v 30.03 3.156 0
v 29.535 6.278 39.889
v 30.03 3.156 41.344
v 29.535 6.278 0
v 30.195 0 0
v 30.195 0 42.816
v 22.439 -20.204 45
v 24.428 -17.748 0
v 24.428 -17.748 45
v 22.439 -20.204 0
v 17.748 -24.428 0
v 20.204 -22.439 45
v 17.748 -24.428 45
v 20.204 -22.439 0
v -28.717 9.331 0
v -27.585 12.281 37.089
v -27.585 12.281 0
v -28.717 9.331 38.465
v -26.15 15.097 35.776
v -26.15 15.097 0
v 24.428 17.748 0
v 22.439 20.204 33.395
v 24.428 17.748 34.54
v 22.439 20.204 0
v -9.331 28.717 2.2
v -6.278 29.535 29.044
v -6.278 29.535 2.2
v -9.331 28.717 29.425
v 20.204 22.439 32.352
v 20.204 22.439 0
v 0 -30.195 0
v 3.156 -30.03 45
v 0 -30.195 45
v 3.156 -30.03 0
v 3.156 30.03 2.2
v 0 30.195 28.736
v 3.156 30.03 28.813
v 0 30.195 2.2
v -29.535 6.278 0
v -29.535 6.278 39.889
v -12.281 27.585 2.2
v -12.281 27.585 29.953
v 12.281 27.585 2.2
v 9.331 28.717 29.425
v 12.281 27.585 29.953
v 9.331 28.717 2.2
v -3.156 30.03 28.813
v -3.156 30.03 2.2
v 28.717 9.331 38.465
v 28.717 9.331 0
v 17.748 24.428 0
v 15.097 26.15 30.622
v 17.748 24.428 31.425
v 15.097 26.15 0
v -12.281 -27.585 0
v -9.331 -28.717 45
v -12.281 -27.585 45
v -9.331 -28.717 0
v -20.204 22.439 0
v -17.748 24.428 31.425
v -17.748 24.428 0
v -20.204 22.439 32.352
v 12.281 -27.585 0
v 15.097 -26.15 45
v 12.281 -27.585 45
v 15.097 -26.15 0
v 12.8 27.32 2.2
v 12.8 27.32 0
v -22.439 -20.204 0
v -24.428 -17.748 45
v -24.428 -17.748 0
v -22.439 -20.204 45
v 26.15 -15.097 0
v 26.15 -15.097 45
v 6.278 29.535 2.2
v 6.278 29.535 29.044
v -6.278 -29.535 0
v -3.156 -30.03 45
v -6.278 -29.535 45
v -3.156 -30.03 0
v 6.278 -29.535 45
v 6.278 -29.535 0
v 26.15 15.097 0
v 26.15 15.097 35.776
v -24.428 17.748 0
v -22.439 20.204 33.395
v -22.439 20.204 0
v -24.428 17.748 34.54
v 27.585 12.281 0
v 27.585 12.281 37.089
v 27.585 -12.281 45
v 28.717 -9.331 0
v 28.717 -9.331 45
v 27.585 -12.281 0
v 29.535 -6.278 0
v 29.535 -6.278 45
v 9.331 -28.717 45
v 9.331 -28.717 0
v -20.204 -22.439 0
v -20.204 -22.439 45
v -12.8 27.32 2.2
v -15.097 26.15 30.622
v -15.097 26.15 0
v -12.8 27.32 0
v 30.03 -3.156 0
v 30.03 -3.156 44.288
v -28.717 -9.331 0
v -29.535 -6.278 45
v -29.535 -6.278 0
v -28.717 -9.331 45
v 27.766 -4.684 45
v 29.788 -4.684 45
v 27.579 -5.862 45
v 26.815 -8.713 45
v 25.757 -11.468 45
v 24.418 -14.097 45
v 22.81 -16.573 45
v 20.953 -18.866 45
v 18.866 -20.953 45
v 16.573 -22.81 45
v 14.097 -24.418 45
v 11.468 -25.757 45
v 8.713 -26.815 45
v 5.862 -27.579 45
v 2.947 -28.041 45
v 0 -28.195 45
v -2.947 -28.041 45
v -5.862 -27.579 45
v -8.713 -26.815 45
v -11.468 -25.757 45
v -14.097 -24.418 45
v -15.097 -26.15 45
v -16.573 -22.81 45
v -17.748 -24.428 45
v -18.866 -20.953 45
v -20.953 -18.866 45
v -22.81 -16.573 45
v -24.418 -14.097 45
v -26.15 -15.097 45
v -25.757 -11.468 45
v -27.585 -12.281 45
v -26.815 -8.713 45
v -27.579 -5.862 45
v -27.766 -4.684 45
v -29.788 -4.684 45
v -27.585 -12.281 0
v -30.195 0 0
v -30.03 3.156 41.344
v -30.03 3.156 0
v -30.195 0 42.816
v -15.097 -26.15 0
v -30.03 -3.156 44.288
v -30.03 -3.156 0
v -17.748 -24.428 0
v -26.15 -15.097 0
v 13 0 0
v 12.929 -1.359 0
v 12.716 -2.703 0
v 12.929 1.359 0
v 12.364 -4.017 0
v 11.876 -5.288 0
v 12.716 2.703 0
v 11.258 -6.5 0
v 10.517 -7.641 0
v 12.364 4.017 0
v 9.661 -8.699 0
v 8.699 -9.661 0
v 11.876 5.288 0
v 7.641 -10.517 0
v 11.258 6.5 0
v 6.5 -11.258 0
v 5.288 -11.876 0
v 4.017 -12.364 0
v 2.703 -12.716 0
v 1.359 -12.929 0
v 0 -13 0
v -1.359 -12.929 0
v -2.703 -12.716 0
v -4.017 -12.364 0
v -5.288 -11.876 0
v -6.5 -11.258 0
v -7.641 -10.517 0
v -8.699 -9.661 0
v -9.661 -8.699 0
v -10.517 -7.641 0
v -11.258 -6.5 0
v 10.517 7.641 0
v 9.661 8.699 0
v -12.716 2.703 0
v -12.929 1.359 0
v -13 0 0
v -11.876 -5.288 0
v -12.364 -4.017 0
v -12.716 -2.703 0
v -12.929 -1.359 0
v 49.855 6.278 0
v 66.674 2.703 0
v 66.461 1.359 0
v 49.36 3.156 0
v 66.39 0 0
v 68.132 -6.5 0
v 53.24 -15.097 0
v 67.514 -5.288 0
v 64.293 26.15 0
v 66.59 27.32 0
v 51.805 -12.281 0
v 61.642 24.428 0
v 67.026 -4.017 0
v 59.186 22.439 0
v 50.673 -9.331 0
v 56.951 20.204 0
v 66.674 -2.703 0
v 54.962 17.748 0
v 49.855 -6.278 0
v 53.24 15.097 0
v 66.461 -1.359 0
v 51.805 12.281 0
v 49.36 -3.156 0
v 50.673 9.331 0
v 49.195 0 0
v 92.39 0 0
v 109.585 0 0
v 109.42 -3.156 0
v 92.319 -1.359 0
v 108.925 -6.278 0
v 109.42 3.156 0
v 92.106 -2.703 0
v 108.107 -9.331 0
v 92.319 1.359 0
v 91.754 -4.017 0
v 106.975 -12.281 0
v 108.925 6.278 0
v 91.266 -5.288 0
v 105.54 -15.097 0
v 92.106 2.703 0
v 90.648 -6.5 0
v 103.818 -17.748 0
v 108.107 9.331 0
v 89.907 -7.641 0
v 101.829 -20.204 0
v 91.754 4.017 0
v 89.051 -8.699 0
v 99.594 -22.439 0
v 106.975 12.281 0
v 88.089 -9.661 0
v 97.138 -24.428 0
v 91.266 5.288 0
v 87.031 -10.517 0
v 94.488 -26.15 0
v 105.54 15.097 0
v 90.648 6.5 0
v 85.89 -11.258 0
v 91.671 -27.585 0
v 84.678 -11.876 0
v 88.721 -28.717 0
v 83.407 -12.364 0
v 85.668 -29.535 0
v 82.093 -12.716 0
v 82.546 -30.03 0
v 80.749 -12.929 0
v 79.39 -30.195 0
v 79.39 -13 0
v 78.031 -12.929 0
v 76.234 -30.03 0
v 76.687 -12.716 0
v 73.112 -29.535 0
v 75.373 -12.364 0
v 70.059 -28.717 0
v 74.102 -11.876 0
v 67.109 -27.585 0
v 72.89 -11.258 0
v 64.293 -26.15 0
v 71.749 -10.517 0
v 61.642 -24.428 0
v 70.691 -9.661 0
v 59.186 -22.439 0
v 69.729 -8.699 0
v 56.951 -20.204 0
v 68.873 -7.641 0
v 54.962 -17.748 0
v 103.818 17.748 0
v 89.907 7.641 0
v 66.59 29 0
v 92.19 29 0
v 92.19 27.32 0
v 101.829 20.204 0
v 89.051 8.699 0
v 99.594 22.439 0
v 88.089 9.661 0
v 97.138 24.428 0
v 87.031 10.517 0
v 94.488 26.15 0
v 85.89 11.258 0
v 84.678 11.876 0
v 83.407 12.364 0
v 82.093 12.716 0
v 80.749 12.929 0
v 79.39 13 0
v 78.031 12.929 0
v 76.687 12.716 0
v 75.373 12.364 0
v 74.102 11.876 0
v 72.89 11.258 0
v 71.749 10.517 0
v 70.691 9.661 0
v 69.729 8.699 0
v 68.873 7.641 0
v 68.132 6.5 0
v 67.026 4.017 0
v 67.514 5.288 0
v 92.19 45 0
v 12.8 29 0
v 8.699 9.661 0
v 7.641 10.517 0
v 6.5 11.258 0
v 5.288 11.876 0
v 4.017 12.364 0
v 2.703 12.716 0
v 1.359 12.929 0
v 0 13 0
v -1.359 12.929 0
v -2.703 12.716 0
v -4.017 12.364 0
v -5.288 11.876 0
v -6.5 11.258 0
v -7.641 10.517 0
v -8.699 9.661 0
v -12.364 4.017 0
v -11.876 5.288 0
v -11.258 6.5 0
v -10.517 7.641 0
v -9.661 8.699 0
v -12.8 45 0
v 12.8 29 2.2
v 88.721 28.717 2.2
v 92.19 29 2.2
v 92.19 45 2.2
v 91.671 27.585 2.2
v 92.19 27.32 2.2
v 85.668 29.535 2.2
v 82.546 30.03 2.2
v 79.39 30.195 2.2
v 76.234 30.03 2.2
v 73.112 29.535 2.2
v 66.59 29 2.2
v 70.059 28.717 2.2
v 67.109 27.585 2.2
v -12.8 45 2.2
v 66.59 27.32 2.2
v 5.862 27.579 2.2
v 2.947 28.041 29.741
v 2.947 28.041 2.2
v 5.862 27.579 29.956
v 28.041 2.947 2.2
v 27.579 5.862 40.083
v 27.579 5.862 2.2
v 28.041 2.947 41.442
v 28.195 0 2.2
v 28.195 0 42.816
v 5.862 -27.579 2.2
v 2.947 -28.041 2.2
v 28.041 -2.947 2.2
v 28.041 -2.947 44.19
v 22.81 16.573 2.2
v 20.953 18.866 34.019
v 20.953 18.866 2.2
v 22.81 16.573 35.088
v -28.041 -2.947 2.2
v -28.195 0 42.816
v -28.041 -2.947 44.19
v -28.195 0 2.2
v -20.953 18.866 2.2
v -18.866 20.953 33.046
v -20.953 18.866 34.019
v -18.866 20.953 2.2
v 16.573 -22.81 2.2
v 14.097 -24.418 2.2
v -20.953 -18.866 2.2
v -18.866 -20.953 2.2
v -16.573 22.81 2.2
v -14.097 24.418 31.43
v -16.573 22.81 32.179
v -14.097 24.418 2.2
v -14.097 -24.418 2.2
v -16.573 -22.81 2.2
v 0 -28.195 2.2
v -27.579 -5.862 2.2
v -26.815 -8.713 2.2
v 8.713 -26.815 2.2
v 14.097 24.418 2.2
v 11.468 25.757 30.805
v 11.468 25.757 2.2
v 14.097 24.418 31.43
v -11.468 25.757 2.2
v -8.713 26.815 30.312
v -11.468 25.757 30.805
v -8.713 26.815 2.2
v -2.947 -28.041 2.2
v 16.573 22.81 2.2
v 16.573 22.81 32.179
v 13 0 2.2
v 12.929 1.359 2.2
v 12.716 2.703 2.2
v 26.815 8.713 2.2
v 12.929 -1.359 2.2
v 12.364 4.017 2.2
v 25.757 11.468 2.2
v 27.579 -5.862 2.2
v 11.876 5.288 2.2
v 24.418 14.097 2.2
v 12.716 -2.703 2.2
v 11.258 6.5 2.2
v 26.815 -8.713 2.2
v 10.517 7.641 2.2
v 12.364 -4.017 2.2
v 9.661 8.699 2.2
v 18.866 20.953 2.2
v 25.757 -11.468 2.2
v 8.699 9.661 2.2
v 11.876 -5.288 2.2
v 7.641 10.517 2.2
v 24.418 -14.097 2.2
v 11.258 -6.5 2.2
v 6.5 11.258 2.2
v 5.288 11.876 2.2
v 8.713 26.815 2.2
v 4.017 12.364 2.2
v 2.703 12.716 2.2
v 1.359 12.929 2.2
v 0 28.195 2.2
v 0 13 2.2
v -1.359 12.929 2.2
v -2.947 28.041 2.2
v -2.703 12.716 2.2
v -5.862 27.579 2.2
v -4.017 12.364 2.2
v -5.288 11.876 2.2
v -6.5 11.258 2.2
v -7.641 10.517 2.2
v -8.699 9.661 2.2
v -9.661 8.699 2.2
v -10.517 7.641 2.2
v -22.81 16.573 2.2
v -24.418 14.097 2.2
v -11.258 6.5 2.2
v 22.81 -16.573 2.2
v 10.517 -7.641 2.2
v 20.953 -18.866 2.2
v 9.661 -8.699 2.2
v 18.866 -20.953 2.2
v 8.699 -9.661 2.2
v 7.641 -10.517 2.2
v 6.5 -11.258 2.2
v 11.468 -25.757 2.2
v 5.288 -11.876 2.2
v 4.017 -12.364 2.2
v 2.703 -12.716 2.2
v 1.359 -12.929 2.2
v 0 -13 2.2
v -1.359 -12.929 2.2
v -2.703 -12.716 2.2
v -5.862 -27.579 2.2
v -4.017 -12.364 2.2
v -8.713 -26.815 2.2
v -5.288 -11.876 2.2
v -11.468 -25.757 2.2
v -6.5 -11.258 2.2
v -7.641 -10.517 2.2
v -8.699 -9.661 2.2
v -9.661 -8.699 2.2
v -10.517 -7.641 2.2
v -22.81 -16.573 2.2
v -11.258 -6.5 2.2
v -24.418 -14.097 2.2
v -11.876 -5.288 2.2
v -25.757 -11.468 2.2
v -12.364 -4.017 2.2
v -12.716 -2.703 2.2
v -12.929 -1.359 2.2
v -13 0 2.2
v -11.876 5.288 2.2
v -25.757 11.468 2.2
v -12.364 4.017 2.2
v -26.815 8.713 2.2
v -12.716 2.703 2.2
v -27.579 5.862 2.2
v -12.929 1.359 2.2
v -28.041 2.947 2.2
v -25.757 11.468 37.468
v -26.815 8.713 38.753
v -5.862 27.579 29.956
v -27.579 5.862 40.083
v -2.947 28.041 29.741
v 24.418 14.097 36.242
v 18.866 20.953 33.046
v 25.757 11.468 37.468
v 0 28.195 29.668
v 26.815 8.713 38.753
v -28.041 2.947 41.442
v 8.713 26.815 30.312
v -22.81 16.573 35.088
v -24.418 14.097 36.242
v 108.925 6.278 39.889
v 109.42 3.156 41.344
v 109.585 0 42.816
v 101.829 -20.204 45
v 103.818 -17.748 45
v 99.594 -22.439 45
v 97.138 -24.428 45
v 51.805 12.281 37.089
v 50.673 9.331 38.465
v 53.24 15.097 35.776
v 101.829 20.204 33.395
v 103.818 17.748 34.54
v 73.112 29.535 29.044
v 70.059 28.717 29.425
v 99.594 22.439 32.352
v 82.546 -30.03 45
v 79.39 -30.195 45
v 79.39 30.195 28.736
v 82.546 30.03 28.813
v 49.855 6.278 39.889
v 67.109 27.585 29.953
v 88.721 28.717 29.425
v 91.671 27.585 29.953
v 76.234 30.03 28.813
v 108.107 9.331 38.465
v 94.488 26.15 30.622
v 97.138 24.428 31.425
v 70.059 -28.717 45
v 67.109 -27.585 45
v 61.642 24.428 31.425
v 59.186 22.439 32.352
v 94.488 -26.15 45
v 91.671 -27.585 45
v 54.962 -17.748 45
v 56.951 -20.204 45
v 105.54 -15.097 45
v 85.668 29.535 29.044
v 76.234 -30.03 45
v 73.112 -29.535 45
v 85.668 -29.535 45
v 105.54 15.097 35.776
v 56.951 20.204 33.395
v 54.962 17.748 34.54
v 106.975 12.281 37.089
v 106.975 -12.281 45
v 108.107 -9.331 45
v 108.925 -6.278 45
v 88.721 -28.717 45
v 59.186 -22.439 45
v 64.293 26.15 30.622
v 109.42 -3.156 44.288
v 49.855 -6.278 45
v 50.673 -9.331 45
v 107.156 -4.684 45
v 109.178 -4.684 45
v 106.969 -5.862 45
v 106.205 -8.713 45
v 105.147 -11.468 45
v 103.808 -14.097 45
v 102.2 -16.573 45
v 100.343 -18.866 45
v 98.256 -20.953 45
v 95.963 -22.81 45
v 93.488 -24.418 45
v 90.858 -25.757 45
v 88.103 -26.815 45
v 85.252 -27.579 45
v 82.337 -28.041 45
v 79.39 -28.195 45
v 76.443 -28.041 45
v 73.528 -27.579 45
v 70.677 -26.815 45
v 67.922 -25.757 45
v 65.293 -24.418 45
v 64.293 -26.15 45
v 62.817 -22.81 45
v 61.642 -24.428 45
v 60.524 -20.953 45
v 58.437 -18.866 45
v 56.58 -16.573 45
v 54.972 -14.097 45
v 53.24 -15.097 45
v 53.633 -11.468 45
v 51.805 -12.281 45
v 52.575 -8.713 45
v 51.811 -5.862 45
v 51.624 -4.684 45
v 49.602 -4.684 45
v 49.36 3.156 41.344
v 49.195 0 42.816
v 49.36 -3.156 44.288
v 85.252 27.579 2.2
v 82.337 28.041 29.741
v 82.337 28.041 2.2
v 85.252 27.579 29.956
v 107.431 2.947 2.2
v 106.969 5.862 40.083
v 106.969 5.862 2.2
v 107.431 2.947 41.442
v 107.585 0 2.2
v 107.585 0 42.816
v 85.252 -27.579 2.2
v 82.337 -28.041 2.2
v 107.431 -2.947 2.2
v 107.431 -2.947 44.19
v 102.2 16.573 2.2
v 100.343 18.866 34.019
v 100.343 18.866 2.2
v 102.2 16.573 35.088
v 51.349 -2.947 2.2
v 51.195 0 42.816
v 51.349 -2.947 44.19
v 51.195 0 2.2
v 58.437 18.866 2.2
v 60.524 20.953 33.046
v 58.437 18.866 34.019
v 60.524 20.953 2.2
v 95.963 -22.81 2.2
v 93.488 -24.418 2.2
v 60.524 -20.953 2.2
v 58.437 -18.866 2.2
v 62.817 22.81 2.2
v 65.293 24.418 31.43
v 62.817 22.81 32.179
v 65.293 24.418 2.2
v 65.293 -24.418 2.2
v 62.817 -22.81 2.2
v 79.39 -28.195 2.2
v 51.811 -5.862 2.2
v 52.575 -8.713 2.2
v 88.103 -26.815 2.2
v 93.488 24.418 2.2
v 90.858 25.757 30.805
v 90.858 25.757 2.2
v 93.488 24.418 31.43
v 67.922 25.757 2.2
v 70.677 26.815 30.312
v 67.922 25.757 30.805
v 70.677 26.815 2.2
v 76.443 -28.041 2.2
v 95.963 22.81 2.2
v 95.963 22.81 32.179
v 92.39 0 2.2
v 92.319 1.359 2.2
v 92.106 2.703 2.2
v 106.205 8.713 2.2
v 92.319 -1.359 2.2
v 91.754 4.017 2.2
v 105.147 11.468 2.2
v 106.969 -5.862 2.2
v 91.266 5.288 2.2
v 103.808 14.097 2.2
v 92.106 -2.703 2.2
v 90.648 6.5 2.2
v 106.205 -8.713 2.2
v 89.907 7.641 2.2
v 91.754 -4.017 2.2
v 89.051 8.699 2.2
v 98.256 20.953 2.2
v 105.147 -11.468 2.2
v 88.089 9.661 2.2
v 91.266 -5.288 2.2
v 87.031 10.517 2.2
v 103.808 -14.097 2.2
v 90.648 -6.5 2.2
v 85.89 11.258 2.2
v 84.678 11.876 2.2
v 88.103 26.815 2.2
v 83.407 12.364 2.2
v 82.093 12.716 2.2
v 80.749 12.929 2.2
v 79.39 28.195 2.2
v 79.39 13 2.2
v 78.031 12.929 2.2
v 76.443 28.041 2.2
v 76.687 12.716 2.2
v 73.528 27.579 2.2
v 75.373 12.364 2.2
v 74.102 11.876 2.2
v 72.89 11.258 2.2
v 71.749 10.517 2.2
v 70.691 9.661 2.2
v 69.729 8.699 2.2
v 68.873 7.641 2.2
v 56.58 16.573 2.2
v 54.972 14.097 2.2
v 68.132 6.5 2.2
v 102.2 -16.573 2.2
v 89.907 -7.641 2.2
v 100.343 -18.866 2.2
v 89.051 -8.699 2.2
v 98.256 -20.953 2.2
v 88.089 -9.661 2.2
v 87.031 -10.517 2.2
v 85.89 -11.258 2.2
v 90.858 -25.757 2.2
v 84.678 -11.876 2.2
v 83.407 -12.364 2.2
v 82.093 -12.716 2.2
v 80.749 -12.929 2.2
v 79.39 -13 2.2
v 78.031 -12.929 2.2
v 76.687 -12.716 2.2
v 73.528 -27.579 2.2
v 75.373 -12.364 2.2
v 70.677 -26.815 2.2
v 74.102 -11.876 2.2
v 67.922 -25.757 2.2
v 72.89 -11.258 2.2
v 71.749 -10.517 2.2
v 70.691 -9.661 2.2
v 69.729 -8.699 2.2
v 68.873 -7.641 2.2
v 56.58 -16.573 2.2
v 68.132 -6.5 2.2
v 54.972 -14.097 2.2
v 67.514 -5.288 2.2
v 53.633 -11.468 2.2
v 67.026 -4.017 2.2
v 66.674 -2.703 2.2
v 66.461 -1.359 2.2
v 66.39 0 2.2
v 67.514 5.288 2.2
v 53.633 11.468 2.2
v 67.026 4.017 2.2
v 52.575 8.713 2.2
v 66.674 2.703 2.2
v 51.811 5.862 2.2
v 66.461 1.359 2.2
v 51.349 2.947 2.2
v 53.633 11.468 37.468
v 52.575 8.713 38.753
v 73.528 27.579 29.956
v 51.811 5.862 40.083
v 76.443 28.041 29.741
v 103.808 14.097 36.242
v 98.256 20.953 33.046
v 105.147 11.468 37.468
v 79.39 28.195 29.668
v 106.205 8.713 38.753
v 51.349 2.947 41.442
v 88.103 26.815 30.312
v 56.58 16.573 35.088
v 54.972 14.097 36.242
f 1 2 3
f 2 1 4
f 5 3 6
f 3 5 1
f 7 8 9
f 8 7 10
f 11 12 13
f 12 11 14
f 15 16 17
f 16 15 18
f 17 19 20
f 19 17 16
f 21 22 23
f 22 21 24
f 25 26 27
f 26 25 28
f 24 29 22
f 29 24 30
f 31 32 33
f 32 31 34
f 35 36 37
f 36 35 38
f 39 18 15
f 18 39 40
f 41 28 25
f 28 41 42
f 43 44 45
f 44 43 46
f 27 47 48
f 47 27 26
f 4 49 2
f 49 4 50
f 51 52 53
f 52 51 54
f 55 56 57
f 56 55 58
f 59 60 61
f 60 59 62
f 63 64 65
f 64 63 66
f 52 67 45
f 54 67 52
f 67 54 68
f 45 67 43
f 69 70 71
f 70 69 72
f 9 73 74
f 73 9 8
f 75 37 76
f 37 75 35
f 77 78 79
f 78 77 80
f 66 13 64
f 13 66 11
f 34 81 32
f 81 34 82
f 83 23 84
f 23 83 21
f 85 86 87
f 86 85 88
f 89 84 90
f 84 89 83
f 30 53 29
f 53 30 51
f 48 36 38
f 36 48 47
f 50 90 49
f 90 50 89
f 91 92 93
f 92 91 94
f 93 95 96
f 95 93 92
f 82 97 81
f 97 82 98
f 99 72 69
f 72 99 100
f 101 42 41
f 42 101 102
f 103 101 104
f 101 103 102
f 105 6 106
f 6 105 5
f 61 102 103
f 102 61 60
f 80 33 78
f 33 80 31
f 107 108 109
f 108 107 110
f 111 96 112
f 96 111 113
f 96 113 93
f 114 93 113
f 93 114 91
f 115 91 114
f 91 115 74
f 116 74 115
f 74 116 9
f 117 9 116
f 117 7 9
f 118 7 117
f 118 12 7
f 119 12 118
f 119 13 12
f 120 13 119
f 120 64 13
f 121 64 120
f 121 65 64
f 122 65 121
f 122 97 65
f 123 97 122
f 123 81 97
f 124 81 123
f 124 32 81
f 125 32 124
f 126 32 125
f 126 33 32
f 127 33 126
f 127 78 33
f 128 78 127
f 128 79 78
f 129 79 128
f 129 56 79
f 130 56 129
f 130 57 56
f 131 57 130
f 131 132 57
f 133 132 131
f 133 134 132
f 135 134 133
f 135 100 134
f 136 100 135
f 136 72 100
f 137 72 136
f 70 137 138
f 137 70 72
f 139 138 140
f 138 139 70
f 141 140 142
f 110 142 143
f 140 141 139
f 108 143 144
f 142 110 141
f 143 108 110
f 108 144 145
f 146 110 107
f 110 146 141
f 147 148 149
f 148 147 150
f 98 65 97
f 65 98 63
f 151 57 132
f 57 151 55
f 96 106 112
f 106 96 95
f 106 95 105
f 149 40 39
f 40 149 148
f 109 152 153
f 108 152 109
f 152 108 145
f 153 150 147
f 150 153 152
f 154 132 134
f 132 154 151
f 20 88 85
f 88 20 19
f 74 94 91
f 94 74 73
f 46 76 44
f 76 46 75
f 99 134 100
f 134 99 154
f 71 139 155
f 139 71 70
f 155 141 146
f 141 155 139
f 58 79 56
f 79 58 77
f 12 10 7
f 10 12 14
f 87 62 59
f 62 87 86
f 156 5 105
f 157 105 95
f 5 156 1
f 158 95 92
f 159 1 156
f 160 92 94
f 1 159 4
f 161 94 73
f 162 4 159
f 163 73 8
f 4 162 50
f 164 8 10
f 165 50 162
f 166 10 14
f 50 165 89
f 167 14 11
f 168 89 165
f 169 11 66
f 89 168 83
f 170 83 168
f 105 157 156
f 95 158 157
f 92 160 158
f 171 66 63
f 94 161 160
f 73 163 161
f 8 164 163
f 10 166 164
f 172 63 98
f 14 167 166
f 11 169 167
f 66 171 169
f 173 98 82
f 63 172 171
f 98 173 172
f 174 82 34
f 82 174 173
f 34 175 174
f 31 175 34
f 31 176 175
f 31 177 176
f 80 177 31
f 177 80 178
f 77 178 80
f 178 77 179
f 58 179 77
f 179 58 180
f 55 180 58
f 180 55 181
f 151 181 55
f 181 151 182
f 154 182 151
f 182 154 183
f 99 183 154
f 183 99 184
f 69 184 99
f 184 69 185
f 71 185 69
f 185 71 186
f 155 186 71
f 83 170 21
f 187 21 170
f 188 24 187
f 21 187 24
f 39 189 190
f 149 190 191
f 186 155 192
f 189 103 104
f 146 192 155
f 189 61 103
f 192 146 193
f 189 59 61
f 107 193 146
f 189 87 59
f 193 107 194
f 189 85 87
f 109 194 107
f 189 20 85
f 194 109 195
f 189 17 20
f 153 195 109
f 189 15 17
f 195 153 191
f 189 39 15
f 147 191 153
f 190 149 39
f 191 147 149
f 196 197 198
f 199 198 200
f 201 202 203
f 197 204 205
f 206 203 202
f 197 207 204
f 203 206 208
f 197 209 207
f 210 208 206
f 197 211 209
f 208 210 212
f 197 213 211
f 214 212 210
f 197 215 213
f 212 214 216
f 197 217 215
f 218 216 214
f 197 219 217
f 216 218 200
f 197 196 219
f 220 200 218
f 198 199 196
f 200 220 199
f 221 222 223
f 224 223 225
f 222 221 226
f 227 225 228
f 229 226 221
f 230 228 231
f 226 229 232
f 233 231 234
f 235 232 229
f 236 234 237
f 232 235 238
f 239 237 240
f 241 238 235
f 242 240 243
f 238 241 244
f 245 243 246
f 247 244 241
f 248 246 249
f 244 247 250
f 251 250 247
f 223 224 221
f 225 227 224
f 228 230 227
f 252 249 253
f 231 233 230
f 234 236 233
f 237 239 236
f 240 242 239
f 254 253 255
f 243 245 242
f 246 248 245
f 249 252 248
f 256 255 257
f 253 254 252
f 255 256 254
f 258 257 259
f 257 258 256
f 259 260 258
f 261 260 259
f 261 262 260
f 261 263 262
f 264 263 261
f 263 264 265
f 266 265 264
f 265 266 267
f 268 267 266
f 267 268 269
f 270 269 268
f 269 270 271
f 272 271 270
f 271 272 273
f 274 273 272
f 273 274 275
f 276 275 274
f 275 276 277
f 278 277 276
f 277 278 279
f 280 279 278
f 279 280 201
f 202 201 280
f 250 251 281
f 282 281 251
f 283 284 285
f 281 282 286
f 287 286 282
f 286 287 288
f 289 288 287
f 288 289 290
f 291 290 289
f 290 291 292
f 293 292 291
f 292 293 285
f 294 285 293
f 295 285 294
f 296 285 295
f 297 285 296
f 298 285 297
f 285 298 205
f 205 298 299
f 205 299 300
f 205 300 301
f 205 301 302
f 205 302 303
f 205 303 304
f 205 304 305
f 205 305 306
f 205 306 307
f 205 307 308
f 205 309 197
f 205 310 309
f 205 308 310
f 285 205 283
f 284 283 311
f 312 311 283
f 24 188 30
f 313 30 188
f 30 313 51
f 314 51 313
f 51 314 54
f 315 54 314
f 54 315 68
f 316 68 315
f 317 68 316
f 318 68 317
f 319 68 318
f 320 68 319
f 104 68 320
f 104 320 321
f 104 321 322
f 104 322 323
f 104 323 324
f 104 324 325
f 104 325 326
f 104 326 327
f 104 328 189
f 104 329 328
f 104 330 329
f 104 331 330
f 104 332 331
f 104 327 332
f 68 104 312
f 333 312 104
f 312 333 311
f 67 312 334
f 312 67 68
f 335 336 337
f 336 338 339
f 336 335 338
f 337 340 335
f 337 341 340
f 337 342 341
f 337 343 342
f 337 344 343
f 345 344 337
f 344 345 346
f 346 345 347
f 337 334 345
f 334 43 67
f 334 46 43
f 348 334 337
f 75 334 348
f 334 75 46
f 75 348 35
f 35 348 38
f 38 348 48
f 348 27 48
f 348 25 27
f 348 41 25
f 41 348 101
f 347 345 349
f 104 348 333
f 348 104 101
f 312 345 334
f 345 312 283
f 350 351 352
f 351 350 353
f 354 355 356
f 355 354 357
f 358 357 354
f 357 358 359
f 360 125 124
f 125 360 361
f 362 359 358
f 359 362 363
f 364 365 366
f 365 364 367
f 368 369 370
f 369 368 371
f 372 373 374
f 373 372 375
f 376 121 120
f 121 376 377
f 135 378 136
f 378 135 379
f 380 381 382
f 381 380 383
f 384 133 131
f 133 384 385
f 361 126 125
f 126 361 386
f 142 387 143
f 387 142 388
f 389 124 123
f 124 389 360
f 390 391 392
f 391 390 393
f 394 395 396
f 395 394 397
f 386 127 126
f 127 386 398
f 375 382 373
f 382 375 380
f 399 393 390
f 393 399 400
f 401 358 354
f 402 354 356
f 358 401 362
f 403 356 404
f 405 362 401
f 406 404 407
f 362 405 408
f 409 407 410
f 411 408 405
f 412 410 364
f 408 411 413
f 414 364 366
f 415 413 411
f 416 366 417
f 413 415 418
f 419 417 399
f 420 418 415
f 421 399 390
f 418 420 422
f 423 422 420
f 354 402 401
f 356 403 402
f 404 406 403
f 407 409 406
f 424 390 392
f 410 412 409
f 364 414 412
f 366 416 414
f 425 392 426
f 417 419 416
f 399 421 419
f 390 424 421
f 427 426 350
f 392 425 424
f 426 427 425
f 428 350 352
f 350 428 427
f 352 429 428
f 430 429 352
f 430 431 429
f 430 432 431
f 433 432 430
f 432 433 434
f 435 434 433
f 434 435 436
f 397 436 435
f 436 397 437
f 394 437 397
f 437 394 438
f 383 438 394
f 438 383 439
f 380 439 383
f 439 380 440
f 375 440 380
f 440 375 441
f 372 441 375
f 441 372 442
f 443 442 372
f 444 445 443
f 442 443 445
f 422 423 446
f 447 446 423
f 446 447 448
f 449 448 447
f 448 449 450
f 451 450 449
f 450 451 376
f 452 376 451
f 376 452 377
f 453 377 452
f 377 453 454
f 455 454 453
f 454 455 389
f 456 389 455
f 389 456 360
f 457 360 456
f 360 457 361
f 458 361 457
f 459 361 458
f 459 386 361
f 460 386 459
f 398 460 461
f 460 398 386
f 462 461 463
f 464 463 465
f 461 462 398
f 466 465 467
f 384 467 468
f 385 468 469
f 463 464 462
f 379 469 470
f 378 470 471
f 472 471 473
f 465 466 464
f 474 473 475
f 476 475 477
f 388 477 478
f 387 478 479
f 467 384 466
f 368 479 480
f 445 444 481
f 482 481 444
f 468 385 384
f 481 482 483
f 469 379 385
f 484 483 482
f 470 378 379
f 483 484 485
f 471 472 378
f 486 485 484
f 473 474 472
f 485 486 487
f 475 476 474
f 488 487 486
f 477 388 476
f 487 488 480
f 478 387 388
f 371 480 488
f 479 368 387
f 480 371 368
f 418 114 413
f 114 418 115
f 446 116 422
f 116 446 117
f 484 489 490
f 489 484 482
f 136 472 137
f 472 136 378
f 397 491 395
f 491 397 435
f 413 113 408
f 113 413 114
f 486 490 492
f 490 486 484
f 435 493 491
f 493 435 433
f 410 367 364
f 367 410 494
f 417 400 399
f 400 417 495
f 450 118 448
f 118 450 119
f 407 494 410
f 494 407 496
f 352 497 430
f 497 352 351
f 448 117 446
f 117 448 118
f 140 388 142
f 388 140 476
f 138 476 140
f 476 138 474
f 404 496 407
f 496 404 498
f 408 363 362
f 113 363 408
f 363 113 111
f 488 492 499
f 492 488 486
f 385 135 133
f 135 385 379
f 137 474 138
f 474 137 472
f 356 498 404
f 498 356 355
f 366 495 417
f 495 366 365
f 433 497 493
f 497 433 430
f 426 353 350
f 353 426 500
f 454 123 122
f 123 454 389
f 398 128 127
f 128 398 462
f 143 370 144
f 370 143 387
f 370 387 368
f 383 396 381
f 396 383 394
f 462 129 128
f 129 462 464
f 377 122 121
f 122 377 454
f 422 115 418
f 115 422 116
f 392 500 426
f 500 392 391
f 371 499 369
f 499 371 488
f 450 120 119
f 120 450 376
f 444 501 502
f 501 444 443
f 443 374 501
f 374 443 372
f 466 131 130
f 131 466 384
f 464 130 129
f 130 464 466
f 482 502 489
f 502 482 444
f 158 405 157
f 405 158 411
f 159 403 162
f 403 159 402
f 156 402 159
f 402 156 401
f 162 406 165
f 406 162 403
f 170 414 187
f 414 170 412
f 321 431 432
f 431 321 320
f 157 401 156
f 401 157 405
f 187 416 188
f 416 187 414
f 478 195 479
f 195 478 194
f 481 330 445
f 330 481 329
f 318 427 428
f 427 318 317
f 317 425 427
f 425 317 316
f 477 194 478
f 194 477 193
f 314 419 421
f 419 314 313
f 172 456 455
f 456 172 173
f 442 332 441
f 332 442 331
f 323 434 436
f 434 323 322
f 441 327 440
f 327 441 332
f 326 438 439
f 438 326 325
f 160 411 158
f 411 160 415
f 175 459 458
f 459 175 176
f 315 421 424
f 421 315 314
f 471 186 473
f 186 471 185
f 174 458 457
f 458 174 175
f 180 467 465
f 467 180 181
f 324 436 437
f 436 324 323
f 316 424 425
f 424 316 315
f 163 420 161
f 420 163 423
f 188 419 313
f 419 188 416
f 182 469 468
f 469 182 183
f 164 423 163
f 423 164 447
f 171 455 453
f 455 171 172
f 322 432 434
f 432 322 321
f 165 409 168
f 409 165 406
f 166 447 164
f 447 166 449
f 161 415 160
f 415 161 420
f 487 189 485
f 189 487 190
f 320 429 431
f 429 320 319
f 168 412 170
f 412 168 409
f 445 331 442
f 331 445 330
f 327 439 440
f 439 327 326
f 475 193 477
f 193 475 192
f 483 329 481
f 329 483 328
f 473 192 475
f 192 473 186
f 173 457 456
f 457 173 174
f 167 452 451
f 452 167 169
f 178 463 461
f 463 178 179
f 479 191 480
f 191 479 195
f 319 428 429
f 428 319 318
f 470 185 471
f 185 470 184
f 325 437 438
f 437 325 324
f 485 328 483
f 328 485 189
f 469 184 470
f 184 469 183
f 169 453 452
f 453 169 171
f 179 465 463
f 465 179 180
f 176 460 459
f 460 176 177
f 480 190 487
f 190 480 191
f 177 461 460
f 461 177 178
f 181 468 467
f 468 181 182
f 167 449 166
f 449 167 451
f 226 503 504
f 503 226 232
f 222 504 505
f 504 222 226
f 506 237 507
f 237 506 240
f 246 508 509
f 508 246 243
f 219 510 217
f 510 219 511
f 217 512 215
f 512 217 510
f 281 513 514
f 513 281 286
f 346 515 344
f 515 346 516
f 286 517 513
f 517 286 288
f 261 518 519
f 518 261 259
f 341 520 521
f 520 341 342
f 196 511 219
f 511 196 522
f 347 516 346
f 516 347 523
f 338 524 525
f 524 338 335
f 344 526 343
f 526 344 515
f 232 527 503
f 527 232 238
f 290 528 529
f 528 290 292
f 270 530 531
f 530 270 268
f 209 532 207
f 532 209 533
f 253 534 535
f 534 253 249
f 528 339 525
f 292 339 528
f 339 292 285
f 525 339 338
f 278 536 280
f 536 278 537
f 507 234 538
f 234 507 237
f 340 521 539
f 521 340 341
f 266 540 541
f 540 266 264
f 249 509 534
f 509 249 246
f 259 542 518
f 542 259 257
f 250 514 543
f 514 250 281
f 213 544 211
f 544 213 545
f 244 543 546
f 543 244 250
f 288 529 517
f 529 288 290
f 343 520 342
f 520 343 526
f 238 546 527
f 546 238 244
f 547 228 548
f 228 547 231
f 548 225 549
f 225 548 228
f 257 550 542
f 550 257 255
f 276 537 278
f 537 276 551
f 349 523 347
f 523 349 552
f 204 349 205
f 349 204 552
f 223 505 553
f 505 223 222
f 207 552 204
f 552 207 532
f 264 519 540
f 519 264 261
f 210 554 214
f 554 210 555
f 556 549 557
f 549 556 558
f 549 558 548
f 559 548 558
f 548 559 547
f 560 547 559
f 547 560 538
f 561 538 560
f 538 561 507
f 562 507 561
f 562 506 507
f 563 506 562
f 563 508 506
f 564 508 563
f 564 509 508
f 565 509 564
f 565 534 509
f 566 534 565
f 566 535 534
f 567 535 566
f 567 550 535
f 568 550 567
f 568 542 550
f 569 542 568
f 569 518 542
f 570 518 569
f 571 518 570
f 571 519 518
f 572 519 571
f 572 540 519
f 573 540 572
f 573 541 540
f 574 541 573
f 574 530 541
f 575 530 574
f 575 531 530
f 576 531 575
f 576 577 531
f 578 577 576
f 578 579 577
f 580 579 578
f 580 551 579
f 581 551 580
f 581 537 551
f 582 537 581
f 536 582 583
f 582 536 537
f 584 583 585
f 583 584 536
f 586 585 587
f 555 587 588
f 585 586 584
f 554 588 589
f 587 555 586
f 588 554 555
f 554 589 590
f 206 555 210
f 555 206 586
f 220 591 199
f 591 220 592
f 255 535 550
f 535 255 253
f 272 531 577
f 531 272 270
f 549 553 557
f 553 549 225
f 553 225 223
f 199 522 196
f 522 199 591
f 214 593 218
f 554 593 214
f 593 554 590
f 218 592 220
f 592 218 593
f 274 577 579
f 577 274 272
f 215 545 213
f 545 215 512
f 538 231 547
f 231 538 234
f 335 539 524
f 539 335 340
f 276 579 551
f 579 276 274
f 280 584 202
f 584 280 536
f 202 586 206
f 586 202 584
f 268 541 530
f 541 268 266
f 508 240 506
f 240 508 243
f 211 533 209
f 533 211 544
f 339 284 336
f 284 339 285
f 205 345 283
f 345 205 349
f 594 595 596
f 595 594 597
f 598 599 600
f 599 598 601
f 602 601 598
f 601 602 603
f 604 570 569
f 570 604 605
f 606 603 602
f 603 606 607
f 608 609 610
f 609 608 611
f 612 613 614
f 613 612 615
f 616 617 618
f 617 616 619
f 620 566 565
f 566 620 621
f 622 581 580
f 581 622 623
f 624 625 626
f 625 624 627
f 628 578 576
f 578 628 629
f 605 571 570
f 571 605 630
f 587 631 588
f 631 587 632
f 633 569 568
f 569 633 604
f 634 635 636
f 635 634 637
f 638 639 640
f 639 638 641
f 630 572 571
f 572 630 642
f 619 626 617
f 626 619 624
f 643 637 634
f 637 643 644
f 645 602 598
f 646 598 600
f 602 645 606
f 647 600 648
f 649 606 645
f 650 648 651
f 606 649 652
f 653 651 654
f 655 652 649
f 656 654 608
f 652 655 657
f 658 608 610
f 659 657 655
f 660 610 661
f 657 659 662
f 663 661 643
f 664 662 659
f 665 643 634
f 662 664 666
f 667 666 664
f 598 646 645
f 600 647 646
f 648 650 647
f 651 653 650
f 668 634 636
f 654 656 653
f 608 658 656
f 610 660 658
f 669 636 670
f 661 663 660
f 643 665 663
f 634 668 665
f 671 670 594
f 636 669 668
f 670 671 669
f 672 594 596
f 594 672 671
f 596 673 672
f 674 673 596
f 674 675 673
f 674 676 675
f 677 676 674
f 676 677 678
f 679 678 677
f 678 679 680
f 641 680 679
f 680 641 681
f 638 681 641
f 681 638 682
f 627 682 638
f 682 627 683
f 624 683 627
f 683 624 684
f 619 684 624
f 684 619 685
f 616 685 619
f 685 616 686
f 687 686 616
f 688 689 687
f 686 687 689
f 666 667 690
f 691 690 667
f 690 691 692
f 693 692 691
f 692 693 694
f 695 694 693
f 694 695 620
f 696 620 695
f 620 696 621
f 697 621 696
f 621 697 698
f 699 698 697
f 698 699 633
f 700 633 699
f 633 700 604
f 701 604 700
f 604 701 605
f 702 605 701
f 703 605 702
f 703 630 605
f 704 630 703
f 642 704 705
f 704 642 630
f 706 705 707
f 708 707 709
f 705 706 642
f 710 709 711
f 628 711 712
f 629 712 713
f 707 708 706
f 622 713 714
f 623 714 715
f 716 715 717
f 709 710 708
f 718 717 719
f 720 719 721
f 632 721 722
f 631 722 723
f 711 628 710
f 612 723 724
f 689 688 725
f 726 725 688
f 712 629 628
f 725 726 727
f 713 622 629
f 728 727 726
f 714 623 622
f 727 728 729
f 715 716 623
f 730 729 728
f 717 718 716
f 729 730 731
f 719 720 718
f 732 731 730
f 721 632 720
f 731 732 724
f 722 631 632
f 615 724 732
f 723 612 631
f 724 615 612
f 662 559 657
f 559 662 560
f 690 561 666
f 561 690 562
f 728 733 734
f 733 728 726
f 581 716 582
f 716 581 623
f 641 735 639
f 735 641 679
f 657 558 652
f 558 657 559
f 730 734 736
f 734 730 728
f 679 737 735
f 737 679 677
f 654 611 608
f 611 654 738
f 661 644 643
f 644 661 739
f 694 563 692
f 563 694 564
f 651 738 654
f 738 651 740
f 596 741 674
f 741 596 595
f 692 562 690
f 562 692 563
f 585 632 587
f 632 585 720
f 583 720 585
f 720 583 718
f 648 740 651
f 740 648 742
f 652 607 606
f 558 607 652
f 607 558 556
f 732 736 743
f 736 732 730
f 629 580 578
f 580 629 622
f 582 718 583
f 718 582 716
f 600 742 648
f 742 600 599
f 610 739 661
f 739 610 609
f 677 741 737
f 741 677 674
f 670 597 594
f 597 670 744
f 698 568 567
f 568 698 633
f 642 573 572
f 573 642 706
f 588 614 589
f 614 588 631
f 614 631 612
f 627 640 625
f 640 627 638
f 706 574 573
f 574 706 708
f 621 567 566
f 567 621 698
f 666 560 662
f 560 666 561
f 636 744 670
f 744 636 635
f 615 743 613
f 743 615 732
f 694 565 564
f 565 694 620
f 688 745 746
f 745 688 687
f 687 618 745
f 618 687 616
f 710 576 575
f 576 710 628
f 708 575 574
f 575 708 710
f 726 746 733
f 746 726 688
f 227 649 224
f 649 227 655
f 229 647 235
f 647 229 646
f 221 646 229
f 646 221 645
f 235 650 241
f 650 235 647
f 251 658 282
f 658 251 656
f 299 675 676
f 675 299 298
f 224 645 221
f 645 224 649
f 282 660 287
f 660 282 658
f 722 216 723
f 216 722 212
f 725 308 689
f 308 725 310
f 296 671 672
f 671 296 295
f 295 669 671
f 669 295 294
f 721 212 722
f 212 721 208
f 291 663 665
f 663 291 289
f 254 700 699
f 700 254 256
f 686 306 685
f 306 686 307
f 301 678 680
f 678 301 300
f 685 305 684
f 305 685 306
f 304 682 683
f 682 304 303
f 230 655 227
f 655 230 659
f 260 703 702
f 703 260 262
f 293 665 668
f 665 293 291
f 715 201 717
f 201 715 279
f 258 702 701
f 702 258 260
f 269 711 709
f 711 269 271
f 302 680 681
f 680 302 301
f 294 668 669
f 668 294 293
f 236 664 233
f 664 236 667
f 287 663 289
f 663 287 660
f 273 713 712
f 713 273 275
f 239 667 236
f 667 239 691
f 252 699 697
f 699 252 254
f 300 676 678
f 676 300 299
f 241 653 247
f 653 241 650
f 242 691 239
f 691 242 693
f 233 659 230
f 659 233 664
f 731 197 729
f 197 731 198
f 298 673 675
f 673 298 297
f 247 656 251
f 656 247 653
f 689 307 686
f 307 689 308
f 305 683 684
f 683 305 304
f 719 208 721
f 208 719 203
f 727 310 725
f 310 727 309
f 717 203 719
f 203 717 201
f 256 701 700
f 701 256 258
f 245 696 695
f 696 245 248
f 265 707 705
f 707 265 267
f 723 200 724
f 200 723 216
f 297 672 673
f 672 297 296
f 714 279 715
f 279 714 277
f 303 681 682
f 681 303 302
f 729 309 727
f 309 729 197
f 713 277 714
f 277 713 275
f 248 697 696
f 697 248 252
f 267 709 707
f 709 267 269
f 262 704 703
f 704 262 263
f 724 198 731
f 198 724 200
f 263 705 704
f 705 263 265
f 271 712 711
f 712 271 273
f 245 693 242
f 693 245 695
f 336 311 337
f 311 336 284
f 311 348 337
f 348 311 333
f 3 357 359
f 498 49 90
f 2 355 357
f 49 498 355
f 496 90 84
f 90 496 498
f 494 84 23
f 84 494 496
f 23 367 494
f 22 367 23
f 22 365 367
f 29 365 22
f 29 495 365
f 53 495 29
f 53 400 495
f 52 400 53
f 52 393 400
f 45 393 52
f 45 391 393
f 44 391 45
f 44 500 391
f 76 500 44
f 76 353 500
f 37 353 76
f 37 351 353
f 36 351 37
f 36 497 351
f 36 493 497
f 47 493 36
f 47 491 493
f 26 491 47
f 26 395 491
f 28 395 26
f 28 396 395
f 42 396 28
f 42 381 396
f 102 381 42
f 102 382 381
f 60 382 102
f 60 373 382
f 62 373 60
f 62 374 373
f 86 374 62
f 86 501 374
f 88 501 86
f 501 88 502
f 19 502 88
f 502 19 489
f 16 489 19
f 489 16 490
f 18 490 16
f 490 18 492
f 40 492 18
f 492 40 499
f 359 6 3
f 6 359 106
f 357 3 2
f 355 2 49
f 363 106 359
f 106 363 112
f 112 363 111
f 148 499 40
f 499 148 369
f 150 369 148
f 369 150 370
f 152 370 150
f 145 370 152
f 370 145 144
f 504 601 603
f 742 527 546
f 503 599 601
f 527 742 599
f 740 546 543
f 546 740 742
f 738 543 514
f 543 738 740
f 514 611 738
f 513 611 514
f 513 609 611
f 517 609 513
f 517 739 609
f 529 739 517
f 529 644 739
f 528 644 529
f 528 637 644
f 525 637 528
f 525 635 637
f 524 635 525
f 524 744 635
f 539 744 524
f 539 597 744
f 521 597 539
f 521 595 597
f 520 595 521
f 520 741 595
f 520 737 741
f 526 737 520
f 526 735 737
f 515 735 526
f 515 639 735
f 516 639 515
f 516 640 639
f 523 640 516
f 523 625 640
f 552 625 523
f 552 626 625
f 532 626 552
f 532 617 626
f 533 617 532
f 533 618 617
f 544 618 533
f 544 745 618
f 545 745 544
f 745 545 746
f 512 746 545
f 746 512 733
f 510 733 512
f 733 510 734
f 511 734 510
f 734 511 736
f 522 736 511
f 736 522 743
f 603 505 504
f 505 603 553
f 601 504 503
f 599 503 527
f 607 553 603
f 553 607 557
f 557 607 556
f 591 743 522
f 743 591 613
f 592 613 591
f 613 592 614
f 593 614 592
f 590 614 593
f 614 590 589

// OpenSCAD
// base thickness
bt = 2.2;

// center most circular cutout diameter
innerD = 26;

// diameter of inner hole that fits around the knob
knobHoleD = 55.79 + 0.6;

// thickness of shield around knob
kt = 2;

// height of shield around knob
kh = 45;

// knob distance, center to center
kd = 79.39;

// U shaped piece that connects 2 knobs
//! arm X (width of the arm)
uX = 25.6;

//! armY (length of arm from center of pot to bridge in arm)
uY1 = 29;

//! UY ( total Y from pot center to top oy connecting U)
uY2 = 45;

// fancy it up by slicing a chunk off the top
//! slice angle
slA = 155;

//! slice Z
slZ = 40;

// end of configurable parameters
$fn = 60;

module base( x )
{
    translate([x, 0, 0])
    {
        difference()
        {
            union()
            {
                cylinder( kh, d = knobHoleD + (2 * kt));
                translate( [-uX/2, 0, 0] )
                    cube( [uX, uY1, bt] );
                
            }
            union()
            {
                translate( [0, 0, bt] )
                    cylinder( kh, d = knobHoleD );
                
                translate( [0, 0, -1] )
                    cylinder( kt + 2, d = innerD );
            }
        }
    }
}

difference()
{
    union()
    {
        base( 0 );
        base( kd );
        translate( [-uX/2, uY1, 0] )
            cube( [kd + uX, uY2 - uY1, bt] );
    }
    union()
    {
        translate( [-500, 500, slZ - 120] )
            rotate( slA, [ 1, 0, 0] )
                cube( [1000, 1000, 100] );
    }
}
